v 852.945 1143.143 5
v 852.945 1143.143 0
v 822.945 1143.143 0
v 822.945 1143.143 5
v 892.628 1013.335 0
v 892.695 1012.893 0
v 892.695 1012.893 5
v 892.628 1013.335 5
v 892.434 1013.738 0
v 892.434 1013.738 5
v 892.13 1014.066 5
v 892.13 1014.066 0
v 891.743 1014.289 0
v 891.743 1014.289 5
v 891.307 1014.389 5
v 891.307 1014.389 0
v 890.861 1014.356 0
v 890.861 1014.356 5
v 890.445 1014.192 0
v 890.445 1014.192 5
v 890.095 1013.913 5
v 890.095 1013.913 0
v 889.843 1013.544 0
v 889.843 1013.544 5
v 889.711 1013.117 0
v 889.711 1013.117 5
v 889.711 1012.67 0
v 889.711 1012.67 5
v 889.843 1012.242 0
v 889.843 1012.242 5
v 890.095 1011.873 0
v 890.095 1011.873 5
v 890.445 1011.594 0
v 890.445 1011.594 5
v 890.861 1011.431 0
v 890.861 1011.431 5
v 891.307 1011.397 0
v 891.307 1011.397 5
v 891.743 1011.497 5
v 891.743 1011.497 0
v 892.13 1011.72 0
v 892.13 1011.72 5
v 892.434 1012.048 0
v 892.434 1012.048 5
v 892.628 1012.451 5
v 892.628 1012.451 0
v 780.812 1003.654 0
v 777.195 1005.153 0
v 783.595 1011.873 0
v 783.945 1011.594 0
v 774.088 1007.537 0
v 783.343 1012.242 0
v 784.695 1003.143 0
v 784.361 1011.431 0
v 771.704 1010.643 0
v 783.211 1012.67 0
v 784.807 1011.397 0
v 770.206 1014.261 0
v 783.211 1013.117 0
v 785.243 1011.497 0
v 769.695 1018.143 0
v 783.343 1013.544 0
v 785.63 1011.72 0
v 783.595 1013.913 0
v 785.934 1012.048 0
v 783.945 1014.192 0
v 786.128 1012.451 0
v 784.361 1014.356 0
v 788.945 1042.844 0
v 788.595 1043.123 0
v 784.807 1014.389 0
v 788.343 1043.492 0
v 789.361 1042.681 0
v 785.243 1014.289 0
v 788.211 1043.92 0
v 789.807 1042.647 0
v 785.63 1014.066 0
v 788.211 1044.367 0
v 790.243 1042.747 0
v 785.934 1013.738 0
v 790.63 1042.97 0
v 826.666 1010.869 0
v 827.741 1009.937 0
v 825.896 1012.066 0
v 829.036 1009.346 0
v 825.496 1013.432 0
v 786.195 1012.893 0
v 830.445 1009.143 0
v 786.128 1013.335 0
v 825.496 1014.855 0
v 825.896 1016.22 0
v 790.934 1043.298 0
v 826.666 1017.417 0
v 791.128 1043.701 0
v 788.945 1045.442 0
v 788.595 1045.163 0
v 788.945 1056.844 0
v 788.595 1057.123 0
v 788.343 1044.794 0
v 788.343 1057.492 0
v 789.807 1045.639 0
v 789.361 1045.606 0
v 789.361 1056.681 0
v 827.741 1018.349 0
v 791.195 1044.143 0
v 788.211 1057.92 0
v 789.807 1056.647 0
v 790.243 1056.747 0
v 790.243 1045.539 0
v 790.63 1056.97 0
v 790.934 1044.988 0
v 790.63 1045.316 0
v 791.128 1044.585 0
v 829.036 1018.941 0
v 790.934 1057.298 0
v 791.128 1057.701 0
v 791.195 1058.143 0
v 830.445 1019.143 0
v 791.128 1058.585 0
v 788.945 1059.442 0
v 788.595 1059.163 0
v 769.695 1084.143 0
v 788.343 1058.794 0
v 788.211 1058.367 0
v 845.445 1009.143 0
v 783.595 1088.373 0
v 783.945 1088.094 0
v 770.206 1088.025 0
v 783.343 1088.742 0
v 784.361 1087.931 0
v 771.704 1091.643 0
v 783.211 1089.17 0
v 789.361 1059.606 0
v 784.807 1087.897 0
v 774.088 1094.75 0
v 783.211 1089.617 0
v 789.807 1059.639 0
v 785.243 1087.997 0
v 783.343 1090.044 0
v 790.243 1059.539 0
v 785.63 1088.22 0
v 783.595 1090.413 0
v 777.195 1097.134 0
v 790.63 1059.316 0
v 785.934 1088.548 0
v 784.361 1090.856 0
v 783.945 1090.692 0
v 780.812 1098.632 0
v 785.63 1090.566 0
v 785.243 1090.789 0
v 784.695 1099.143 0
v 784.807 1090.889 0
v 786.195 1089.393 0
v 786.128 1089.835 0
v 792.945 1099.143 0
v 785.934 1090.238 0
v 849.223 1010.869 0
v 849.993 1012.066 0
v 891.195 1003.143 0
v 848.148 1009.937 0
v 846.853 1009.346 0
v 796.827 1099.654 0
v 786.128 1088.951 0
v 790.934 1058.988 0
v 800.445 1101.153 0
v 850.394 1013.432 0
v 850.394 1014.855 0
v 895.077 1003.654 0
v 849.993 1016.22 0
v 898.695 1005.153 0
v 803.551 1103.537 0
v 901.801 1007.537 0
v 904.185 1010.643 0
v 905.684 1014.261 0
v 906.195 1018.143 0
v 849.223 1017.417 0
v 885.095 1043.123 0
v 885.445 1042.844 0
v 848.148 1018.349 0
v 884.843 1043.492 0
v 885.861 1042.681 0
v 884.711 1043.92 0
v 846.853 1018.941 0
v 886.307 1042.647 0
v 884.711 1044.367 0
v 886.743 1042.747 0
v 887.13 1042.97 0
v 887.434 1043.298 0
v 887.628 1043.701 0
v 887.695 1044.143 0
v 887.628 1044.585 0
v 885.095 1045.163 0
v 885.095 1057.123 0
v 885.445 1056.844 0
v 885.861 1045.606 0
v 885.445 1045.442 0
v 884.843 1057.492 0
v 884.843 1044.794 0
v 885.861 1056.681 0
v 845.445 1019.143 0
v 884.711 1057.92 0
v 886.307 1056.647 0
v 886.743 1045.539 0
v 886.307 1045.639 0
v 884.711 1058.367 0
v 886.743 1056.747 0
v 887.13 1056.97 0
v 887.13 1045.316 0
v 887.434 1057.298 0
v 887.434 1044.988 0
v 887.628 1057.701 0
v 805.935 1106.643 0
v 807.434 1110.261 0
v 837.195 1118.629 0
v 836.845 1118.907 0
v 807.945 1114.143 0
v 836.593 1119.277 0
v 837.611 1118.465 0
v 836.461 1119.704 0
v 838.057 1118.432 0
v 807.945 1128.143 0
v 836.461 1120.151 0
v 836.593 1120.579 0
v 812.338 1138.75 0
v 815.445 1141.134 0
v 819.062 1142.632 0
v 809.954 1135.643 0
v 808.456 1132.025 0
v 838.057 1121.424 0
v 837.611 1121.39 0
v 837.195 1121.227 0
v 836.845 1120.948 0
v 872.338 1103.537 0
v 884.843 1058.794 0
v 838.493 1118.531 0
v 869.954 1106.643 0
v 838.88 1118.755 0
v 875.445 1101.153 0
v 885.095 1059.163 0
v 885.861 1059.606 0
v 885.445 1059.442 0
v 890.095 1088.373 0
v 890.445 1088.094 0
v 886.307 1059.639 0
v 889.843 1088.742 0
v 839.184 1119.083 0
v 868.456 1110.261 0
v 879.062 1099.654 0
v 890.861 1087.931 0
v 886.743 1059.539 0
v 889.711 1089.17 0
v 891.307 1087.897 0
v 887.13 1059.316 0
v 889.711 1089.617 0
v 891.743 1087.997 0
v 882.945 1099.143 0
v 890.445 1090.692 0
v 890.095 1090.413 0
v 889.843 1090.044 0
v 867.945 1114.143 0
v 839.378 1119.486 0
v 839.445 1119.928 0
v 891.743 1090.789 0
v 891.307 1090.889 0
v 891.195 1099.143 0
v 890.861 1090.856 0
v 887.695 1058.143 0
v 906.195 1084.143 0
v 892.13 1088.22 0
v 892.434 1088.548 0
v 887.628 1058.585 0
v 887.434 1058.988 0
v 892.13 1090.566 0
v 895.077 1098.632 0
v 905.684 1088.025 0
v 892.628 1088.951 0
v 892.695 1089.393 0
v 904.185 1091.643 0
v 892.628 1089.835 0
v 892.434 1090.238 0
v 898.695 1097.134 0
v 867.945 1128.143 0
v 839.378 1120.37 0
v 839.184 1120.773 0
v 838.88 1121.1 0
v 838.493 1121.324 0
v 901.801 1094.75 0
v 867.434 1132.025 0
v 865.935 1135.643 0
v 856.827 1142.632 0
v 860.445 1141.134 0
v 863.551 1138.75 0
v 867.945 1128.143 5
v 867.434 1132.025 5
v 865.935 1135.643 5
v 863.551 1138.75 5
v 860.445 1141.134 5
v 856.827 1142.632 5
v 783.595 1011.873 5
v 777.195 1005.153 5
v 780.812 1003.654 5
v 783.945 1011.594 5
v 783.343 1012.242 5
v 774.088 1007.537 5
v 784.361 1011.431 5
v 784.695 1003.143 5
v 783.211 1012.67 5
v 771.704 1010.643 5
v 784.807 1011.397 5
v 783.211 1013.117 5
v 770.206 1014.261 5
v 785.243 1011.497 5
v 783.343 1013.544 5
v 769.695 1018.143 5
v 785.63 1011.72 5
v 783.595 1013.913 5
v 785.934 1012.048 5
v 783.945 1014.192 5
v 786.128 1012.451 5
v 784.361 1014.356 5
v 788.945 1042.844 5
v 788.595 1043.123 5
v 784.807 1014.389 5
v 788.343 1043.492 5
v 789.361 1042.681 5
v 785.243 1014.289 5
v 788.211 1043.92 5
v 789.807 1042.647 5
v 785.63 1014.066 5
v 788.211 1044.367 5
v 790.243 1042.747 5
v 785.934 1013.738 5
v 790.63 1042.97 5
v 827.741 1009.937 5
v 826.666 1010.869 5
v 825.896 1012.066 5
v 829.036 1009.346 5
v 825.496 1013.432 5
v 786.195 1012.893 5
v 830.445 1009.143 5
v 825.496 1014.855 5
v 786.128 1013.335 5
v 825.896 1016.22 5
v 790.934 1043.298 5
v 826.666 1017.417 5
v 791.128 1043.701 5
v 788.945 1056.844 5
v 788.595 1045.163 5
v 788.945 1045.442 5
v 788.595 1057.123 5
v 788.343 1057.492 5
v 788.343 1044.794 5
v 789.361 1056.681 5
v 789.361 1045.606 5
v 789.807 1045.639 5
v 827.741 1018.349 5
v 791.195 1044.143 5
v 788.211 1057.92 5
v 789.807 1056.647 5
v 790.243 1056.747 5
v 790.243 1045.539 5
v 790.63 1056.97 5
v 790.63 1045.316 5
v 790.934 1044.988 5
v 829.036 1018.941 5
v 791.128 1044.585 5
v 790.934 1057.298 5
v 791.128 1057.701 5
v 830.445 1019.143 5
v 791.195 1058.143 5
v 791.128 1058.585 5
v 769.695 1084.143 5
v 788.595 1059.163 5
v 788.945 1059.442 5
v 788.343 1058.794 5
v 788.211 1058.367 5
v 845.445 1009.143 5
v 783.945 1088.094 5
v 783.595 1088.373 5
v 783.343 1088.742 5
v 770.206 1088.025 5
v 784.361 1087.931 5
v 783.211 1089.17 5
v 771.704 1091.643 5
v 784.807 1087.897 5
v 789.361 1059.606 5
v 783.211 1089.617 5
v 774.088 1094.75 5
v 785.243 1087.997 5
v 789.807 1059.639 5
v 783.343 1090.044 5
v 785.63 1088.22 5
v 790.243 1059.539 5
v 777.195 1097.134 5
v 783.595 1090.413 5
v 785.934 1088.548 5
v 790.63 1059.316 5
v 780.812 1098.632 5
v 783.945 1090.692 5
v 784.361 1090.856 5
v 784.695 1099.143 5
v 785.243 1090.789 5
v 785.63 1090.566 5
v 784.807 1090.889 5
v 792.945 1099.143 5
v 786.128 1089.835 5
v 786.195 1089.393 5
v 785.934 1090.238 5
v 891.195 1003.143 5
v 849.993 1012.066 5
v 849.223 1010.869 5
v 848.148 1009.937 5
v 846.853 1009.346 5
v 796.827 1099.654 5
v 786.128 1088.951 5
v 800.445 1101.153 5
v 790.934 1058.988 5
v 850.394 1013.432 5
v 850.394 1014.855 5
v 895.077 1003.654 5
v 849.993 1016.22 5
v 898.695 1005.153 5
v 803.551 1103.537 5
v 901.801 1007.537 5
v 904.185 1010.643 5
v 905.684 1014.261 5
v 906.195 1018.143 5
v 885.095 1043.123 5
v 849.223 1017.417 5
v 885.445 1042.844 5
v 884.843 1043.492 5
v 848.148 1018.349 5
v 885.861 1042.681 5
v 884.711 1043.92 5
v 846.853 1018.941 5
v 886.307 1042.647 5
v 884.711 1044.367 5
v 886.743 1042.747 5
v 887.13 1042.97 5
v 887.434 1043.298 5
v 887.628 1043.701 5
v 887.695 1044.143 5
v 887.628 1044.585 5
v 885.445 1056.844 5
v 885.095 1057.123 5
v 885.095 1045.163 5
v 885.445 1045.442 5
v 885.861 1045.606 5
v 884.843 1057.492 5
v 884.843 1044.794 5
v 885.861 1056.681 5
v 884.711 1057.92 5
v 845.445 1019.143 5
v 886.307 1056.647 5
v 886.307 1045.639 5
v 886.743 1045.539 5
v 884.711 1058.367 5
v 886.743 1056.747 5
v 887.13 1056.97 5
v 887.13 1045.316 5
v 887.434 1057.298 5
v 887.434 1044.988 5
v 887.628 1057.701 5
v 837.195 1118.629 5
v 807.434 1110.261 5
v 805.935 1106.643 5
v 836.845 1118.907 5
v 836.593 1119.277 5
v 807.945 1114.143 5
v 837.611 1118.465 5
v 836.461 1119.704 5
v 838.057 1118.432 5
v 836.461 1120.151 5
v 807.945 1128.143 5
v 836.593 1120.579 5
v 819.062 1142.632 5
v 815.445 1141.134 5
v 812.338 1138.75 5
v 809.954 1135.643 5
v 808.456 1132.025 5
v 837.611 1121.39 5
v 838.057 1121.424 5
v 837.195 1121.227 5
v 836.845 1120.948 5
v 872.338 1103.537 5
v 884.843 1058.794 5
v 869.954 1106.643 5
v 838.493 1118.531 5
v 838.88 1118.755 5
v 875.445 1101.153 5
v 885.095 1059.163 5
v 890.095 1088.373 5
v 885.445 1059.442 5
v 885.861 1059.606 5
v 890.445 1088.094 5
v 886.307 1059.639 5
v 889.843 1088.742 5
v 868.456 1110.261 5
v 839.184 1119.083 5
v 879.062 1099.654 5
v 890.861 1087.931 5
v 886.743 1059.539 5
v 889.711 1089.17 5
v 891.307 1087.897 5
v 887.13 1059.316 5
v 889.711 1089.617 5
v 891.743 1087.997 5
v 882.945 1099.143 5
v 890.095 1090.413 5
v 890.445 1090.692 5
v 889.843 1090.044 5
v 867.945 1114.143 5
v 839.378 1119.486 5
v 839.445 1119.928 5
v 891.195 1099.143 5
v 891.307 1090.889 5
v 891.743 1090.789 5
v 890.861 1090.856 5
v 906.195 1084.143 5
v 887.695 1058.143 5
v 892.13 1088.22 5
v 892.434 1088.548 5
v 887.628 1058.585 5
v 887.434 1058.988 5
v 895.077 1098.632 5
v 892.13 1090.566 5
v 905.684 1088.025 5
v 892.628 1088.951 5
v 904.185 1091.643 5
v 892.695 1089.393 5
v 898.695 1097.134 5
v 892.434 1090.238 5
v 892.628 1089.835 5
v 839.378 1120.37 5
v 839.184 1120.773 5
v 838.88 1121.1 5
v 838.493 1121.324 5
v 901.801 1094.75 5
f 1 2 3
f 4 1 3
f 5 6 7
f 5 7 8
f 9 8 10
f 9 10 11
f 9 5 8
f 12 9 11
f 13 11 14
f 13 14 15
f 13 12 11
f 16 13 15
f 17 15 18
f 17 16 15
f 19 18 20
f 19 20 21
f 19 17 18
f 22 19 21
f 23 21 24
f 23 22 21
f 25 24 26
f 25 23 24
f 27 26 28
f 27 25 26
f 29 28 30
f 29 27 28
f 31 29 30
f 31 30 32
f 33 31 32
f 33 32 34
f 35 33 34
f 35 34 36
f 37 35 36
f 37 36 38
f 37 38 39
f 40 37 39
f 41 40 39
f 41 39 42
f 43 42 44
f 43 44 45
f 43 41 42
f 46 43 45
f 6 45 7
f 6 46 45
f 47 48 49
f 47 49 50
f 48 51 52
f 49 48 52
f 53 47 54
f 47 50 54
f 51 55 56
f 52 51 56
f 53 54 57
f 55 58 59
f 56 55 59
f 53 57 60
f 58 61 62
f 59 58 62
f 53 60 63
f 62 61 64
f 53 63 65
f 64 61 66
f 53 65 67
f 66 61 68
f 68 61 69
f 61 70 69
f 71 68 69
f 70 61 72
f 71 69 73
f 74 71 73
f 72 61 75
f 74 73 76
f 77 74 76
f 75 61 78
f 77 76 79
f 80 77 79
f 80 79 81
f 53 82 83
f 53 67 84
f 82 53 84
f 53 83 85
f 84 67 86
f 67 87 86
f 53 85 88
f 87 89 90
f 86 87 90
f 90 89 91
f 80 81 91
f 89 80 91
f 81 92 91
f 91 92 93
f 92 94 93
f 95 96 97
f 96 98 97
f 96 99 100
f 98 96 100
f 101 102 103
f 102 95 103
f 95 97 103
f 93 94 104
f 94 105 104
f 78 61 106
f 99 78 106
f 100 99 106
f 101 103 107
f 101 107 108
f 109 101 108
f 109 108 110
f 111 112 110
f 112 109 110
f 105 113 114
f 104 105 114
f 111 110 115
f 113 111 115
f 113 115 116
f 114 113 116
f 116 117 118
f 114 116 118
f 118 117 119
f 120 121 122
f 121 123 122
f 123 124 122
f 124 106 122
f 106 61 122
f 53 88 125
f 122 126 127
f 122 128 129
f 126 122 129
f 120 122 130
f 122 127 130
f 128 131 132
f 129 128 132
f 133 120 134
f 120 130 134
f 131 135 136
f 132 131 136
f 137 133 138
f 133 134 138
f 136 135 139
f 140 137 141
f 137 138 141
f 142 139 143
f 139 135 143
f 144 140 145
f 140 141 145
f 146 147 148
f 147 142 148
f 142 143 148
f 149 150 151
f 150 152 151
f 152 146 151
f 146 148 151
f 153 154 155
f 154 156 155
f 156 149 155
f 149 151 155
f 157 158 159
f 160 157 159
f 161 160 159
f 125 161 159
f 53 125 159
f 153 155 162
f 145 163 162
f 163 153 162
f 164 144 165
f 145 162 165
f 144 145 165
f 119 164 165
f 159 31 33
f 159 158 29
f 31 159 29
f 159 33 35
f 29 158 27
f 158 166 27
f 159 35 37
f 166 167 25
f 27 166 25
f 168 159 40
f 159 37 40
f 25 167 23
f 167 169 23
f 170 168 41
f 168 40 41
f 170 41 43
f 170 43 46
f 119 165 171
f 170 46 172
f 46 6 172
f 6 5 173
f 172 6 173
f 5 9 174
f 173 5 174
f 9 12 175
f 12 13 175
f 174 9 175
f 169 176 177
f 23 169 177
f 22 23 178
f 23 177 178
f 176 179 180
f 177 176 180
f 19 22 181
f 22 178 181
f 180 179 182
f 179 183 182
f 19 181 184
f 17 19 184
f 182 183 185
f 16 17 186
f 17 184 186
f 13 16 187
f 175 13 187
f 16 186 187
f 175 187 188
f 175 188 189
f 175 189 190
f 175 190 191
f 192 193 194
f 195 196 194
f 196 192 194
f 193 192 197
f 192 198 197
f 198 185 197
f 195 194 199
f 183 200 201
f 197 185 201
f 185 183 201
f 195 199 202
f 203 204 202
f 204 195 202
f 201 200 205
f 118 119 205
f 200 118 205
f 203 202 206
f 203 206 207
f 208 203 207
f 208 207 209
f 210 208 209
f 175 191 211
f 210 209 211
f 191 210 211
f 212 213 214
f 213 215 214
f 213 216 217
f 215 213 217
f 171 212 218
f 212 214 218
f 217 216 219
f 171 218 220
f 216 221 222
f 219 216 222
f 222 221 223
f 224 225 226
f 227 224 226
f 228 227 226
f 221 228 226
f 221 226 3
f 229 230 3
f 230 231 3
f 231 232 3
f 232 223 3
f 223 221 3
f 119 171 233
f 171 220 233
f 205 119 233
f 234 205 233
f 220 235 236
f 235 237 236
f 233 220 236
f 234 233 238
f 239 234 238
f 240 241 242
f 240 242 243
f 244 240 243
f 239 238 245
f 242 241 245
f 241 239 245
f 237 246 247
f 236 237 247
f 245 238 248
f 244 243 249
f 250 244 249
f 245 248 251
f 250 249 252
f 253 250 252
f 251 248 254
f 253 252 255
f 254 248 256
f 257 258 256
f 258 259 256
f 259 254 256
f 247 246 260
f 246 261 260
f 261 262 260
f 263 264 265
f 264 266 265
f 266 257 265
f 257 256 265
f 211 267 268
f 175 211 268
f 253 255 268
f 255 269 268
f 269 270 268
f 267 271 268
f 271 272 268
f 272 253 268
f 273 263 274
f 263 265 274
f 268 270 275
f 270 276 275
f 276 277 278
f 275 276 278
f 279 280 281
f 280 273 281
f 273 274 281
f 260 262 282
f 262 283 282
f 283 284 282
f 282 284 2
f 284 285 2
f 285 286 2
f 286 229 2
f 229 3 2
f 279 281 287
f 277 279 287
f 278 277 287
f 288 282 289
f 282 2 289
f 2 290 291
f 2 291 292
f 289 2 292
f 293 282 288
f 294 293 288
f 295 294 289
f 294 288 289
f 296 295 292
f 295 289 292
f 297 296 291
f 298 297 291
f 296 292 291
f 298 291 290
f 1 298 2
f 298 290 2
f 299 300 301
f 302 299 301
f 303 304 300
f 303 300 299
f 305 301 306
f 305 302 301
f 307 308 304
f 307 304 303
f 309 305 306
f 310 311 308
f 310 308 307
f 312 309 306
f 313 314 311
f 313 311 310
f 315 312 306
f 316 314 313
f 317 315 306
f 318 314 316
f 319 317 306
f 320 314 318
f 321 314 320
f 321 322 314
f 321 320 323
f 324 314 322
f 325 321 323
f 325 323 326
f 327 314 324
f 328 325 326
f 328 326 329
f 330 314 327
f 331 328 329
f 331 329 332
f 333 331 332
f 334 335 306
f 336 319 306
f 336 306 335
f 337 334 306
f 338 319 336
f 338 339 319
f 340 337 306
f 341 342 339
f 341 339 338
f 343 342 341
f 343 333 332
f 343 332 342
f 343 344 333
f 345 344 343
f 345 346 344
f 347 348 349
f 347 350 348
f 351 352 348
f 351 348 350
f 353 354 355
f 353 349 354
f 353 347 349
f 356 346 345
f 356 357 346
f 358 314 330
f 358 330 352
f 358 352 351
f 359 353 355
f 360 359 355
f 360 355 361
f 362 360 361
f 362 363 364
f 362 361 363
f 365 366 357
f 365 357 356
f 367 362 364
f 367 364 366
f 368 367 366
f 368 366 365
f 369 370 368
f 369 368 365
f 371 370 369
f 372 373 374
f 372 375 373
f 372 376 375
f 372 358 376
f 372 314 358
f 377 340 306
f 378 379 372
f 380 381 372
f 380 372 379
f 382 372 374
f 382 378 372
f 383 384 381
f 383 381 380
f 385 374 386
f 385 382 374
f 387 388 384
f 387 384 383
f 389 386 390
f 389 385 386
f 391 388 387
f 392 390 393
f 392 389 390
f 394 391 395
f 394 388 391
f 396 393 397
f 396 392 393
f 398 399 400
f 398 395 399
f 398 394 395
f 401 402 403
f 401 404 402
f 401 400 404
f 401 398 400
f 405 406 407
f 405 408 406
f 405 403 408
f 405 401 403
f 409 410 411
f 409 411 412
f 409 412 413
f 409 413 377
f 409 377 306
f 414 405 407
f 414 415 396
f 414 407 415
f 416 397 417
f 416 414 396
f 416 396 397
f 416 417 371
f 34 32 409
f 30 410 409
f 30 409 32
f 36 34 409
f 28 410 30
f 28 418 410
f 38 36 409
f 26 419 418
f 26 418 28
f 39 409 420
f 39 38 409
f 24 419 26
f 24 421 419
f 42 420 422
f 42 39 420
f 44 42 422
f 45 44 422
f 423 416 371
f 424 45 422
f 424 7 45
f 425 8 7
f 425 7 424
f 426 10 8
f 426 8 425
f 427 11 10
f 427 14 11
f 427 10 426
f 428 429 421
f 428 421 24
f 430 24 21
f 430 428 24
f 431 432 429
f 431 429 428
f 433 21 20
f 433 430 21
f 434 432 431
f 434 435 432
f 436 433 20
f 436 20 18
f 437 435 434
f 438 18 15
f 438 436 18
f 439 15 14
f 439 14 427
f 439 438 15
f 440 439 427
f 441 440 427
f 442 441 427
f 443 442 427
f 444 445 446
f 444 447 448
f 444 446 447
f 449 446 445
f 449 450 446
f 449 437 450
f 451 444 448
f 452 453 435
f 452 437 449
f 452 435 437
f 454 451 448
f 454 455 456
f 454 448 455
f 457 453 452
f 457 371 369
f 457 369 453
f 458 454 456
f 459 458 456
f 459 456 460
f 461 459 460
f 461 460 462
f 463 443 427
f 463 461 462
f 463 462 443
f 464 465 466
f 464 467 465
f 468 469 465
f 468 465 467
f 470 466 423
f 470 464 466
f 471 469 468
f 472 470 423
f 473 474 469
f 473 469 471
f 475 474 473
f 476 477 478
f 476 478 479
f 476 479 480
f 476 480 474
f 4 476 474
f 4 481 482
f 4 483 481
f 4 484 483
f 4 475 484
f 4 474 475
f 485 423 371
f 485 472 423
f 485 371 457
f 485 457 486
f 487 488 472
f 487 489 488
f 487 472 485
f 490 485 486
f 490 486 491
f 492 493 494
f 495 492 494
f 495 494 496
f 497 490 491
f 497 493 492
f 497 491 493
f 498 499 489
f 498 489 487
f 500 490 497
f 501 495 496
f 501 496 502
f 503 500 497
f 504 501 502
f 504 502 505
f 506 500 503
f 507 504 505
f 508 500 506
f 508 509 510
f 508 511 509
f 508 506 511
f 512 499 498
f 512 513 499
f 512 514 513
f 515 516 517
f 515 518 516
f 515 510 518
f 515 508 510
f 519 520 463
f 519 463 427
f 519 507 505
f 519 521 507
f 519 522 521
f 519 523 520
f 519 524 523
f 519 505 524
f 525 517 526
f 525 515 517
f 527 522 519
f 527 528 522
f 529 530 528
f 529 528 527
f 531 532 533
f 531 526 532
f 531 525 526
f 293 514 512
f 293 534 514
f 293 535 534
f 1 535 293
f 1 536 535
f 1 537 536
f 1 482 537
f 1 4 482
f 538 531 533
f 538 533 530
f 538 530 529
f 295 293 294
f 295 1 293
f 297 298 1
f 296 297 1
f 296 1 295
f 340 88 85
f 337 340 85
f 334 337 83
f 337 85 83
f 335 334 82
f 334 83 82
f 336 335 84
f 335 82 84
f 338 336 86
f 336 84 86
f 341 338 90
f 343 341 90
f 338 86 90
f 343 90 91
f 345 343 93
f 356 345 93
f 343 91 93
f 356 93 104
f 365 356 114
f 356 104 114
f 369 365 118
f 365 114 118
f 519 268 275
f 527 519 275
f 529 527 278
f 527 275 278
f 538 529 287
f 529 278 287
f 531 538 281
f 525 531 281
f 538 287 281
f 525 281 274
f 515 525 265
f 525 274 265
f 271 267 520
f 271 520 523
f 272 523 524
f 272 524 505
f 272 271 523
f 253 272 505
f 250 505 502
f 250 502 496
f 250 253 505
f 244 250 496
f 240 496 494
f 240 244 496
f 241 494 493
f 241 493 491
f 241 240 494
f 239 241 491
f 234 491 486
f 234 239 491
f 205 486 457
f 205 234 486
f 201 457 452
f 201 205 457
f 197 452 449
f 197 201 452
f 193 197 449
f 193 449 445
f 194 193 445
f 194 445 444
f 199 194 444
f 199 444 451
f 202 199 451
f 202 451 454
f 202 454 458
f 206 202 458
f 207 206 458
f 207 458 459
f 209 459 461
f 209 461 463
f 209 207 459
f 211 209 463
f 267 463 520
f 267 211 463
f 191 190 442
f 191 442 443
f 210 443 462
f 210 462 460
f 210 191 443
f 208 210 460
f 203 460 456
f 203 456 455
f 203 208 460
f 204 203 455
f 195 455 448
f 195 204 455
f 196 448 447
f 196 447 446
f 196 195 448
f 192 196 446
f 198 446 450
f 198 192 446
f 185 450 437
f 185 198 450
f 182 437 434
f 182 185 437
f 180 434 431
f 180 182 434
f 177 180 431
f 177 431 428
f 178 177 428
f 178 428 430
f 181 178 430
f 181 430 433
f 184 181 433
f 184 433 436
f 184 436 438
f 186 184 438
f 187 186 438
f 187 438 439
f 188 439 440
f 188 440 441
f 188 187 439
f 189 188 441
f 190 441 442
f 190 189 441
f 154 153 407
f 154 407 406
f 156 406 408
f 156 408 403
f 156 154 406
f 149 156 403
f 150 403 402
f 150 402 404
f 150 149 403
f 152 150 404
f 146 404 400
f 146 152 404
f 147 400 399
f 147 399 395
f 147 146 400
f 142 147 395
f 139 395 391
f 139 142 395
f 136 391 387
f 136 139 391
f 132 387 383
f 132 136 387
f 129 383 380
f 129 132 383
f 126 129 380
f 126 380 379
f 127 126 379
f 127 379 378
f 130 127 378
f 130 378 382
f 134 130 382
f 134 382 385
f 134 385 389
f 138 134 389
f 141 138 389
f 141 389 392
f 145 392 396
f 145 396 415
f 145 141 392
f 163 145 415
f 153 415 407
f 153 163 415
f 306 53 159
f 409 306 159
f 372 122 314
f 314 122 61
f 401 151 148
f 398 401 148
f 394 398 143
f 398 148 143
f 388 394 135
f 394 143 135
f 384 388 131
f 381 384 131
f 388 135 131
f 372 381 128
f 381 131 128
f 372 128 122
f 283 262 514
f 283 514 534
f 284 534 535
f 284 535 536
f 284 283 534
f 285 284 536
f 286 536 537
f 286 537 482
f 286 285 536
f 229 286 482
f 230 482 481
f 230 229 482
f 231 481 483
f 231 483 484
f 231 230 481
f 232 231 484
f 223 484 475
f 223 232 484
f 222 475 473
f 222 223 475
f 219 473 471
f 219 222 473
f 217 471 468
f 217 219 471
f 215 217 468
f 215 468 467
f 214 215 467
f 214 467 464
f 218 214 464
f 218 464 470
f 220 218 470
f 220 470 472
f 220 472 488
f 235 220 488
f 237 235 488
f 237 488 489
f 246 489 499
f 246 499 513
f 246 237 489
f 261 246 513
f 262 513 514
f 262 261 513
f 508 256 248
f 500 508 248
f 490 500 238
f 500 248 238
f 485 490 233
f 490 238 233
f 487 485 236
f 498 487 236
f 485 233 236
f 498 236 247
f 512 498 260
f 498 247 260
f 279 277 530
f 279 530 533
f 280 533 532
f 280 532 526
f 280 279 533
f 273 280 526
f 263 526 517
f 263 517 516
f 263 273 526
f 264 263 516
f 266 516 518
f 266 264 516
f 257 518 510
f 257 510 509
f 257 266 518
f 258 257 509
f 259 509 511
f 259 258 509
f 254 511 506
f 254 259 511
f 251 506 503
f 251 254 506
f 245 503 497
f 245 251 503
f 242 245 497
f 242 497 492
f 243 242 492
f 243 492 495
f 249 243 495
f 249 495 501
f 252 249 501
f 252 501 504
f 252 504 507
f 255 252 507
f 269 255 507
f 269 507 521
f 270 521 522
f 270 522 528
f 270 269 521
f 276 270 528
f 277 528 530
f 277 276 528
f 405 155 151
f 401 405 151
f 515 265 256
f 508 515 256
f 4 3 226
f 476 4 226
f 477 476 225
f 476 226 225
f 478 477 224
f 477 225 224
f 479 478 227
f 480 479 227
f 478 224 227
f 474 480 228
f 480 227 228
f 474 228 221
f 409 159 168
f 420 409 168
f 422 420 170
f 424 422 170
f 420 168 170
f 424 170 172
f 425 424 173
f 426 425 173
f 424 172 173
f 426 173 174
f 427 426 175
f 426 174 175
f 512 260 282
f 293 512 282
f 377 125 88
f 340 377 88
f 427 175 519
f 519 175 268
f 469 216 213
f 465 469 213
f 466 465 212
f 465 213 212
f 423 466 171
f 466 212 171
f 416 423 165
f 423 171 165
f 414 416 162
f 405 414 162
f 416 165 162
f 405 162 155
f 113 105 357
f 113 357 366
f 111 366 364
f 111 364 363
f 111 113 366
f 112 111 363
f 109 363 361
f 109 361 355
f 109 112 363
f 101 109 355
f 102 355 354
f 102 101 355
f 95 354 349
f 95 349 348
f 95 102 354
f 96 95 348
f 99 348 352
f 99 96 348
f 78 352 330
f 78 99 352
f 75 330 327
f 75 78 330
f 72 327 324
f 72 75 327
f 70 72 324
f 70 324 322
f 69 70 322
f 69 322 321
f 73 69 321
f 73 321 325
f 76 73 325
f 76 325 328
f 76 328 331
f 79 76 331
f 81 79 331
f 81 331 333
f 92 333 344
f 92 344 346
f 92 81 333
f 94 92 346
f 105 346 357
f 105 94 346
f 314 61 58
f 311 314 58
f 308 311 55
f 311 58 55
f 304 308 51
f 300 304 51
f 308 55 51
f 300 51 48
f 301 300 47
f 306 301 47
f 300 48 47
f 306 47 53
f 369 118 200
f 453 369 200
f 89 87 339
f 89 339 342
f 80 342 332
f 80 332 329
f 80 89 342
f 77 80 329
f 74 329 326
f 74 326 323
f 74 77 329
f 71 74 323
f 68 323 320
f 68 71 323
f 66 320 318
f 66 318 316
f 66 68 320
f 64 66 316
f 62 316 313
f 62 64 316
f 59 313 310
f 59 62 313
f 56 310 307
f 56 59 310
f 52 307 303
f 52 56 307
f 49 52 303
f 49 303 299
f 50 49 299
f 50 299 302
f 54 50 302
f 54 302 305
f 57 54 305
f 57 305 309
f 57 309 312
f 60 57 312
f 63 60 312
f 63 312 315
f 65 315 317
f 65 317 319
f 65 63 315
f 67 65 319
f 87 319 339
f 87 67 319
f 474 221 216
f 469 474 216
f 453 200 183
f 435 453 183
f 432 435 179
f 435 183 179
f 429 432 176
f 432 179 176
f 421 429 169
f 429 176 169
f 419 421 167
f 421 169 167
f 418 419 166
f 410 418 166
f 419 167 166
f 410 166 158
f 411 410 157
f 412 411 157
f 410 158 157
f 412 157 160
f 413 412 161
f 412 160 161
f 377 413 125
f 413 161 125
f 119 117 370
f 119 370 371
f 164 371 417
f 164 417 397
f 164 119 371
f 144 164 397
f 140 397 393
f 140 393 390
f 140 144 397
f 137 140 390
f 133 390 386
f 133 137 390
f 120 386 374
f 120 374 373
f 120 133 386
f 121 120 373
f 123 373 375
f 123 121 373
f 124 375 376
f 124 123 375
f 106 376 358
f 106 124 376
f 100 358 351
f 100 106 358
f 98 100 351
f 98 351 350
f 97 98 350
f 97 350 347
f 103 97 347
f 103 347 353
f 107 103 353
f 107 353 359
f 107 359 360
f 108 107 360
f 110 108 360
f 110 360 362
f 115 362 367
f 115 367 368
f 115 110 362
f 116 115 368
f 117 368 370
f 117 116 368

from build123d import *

# Parameters (mm, degrees)
SKETCH2_R           = 1.5
BOSS_EXTRUDE1_DEPTH = 5


with BuildPart() as part:
    # Sketch2 → Boss-Extrude1 (new body)
    with BuildSketch(Plane.XY):
        with BuildLine():
            Line((807.944636851, 1128.1431403), (807.944636851, 1114.1431403))
            ThreePointArc((807.944636851, 1114.1431403), (803.551238569, 1103.536538582), (792.944636851, 1099.1431403))
            Line((792.944636851, 1099.1431403), (784.694636851, 1099.1431403))
            ThreePointArc((784.694636851, 1099.1431403), (774.088035133, 1094.749742018), (769.694636851, 1084.1431403))
            Line((769.694636851, 1084.1431403), (769.694636851, 1018.1431403))
            ThreePointArc((769.694636851, 1018.1431403), (774.088035133, 1007.536538582), (784.694636851, 1003.1431403))
            Line((784.694636851, 1003.1431403), (891.194636851, 1003.1431403))
            ThreePointArc((891.194636851, 1003.1431403), (901.801238569, 1007.536538582), (906.194636851, 1018.1431403))
            Line((906.194636851, 1018.1431403), (906.194636851, 1084.1431403))
            ThreePointArc((906.194636851, 1084.1431403), (901.801238569, 1094.749742018), (891.194636851, 1099.1431403))
            Line((891.194636851, 1099.1431403), (882.944636851, 1099.1431403))
            ThreePointArc((882.944636851, 1099.1431403), (872.338035133, 1103.536538582), (867.944636851, 1114.1431403))
            Line((867.944636851, 1114.1431403), (867.944636851, 1128.1431403))
            ThreePointArc((867.944636851, 1128.1431403), (863.551238569, 1138.749742018), (852.944636851, 1143.1431403))
            Line((852.944636851, 1143.1431403), (822.944636851, 1143.1431403))
            ThreePointArc((822.944636851, 1143.1431403), (812.338035133, 1138.749742018), (807.944636851, 1128.1431403))
        make_face()
        with Locations((837.944636851, 1119.927749991)):
            Circle(SKETCH2_R, mode=Mode.SUBTRACT)
        with Locations((784.694636851, 1012.8931403)):
            Circle(SKETCH2_R, mode=Mode.SUBTRACT)
        with Locations((886.194636851, 1044.1431403)):
            Circle(SKETCH2_R, mode=Mode.SUBTRACT)
        with Locations((886.194636851, 1058.1431403)):
            Circle(SKETCH2_R, mode=Mode.SUBTRACT)
        with Locations((789.694636851, 1044.1431403)):
            Circle(SKETCH2_R, mode=Mode.SUBTRACT)
        with Locations((789.694636851, 1058.1431403)):
            Circle(SKETCH2_R, mode=Mode.SUBTRACT)
        with Locations((784.694636851, 1089.3931403)):
            Circle(SKETCH2_R, mode=Mode.SUBTRACT)
        with Locations((891.194636851, 1089.3931403)):
            Circle(SKETCH2_R, mode=Mode.SUBTRACT)
        with Locations((891.194636851, 1012.8931403)):
            Circle(SKETCH2_R, mode=Mode.SUBTRACT)
        with BuildLine():
            Line((845.444636851, 1009.1431403), (830.444636851, 1009.1431403))
            ThreePointArc((830.444636851, 1009.1431403), (825.444636851, 1014.1431403), (830.444636851, 1019.1431403))
            Line((830.444636851, 1019.1431403), (845.444636851, 1019.1431403))
            ThreePointArc((845.444636851, 1019.1431403), (850.444636851, 1014.1431403), (845.444636851, 1009.1431403))
        make_face(mode=Mode.SUBTRACT)
    extrude(amount=BOSS_EXTRUDE1_DEPTH)


solid = part.part
